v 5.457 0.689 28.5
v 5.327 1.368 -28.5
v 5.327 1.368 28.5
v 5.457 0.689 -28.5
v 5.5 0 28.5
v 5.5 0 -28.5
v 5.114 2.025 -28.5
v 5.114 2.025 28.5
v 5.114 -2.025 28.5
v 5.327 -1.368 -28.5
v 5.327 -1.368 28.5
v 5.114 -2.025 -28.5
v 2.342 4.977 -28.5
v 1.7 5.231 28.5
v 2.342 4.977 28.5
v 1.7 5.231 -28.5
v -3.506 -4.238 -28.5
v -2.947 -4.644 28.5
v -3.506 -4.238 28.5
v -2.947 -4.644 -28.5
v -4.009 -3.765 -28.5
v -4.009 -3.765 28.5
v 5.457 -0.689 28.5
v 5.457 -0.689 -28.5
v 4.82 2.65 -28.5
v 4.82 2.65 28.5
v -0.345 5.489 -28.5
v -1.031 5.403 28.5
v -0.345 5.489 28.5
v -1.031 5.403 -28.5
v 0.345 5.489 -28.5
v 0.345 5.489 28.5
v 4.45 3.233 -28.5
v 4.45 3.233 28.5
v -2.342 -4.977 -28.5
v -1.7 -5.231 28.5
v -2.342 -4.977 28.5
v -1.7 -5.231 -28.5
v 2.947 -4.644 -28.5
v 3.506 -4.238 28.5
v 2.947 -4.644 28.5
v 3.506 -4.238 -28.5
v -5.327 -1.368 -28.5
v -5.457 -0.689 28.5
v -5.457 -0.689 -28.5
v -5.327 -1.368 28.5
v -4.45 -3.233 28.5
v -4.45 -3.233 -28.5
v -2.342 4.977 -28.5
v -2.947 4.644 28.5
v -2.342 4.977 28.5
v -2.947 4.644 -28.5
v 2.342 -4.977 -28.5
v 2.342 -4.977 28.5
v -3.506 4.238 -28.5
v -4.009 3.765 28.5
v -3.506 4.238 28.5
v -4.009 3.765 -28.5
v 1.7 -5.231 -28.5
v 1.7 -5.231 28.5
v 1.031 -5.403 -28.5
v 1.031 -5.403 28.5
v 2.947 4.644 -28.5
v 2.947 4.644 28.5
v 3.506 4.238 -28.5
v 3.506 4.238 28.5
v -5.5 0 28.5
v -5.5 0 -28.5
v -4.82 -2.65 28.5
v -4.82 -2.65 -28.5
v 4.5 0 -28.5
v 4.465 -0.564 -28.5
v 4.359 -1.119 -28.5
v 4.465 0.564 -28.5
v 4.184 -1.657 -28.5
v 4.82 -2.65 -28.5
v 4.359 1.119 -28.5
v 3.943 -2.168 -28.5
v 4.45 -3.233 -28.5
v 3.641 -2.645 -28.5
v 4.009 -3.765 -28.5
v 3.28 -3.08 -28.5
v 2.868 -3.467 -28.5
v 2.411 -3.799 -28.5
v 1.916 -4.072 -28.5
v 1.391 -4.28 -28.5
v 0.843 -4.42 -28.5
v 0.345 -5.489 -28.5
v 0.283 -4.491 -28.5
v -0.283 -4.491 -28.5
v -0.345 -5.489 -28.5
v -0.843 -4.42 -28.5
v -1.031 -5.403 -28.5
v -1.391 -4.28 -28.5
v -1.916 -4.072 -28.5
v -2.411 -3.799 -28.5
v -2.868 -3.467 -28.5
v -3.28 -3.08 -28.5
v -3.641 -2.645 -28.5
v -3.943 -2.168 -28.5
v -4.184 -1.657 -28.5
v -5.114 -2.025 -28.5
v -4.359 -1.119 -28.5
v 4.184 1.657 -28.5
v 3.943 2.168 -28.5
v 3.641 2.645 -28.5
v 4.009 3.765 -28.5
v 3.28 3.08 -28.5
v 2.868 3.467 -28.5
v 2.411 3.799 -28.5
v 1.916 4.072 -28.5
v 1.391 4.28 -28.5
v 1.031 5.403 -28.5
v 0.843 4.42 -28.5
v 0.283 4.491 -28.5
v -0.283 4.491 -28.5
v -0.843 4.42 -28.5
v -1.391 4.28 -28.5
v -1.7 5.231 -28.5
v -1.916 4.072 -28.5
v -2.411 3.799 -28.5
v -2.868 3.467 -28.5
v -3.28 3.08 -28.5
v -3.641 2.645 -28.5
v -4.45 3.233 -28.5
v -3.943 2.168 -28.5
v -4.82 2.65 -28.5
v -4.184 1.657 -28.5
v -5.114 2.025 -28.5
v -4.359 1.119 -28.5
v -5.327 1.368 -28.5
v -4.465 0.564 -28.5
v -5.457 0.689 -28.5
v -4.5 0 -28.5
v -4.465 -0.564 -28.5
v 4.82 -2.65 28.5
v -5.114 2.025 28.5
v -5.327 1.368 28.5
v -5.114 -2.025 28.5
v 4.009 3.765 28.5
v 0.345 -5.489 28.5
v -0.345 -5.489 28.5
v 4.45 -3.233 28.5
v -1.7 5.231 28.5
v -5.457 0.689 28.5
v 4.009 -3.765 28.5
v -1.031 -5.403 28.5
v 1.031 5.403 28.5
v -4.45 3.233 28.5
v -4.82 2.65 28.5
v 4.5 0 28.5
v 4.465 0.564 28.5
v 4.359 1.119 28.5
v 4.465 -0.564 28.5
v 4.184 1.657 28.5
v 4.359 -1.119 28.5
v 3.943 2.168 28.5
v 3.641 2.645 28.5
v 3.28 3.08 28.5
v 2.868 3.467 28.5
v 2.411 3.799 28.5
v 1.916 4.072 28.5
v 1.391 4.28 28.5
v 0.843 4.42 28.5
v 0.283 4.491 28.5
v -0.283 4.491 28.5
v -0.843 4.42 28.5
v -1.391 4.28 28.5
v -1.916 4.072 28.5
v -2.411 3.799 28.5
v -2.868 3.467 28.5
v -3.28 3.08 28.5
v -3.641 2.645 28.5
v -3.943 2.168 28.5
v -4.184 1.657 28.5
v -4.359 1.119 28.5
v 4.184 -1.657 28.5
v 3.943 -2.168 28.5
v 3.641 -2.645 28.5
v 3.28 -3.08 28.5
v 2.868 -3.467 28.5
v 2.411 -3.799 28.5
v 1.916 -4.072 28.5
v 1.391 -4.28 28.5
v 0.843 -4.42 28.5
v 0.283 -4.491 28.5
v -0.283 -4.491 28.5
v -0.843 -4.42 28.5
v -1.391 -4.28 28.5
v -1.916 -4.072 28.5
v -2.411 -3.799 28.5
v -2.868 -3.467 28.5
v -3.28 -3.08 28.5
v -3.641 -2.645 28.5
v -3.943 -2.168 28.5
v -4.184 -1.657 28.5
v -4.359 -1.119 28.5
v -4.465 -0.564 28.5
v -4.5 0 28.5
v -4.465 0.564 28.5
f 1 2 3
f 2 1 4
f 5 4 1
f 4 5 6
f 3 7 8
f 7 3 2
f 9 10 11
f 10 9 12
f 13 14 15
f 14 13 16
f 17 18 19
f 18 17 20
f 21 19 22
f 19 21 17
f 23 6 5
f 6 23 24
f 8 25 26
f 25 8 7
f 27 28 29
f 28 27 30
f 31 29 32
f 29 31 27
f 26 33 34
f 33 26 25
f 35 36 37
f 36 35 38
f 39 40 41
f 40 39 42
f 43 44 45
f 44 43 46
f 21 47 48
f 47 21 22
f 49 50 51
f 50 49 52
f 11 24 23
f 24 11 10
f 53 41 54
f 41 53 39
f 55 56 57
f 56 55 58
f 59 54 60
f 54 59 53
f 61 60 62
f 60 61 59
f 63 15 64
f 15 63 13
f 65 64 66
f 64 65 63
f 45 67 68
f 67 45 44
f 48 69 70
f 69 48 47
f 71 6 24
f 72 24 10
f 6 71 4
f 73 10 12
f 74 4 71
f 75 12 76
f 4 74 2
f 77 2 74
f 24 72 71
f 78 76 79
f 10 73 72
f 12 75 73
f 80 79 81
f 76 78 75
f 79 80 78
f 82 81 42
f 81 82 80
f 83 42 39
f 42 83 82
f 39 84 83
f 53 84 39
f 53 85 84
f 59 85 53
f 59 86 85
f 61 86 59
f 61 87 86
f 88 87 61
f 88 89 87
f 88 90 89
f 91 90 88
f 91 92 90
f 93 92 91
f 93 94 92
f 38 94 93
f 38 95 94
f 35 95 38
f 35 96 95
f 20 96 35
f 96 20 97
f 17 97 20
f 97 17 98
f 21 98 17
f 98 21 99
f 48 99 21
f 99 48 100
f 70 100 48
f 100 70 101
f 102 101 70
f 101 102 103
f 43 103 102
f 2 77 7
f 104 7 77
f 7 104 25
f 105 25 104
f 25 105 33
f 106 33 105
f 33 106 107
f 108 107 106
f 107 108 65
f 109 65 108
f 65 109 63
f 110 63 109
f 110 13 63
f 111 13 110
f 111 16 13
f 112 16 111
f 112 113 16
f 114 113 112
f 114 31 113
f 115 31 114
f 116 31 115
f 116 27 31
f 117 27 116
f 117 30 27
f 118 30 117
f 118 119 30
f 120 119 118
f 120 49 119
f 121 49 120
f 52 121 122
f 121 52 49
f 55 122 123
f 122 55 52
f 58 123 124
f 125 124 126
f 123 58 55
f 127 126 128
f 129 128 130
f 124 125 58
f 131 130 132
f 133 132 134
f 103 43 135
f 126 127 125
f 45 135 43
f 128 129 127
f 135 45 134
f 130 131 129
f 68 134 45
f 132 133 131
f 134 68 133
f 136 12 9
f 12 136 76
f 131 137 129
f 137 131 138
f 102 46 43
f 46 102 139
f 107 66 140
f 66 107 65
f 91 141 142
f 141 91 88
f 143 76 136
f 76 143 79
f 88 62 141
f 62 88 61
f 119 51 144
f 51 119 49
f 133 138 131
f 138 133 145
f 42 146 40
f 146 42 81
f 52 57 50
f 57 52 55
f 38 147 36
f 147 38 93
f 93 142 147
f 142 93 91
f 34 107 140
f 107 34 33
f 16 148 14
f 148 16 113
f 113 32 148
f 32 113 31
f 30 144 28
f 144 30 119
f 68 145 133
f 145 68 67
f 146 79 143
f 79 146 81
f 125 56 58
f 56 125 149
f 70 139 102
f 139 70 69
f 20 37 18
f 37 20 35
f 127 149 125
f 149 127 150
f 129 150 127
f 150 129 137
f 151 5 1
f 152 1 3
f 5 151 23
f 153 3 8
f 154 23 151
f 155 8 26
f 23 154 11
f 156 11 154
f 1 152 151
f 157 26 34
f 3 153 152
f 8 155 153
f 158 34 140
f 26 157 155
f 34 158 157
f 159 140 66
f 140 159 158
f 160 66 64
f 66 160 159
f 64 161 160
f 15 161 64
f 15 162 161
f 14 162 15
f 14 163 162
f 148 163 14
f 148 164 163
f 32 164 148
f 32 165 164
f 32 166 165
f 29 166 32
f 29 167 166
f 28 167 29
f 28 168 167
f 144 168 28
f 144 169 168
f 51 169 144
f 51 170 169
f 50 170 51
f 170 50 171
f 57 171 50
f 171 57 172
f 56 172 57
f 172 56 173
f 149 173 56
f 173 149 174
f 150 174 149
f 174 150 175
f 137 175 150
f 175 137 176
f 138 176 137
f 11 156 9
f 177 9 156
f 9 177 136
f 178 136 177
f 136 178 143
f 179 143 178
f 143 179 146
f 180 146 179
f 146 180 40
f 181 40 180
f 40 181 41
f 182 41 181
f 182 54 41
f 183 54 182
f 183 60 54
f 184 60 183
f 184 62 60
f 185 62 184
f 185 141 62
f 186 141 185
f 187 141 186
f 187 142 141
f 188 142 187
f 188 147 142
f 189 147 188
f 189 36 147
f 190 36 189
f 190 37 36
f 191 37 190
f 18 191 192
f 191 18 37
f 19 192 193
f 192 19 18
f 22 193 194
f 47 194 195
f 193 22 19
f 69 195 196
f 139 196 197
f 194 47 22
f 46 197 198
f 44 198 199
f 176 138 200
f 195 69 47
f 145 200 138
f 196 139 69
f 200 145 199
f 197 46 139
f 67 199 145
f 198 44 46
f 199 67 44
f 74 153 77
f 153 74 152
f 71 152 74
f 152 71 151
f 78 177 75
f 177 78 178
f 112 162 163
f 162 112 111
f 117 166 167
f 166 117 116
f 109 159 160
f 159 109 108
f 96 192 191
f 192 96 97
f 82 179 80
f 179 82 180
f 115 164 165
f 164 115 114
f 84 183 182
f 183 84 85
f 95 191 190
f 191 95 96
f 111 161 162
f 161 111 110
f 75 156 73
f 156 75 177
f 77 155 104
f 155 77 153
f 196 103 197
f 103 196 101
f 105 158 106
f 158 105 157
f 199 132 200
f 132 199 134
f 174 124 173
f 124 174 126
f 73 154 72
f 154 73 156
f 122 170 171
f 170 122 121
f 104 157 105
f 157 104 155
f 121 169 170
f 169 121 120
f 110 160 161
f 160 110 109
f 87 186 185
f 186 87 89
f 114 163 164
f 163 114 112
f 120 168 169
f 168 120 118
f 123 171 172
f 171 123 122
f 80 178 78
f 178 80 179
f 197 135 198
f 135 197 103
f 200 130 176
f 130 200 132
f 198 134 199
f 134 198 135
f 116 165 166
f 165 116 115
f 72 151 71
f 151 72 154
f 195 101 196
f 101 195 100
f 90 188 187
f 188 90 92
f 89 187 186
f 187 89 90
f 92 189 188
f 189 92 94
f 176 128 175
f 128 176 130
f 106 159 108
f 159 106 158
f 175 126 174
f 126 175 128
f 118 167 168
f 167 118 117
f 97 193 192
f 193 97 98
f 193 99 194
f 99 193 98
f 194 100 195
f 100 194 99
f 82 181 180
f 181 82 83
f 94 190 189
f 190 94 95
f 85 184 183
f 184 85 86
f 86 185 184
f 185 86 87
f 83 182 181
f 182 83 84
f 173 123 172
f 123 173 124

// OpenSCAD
$fn = 50;


difference() {
	union() {
		translate(v = [0, 0, -28.5000000000]) {
			cylinder(h = 57, r = 5.5000000000);
		}
	}
	union() {
		translate(v = [0, 0, -100.0000000000]) {
			cylinder(h = 200, r = 4.5000000000);
		}
	}
}
